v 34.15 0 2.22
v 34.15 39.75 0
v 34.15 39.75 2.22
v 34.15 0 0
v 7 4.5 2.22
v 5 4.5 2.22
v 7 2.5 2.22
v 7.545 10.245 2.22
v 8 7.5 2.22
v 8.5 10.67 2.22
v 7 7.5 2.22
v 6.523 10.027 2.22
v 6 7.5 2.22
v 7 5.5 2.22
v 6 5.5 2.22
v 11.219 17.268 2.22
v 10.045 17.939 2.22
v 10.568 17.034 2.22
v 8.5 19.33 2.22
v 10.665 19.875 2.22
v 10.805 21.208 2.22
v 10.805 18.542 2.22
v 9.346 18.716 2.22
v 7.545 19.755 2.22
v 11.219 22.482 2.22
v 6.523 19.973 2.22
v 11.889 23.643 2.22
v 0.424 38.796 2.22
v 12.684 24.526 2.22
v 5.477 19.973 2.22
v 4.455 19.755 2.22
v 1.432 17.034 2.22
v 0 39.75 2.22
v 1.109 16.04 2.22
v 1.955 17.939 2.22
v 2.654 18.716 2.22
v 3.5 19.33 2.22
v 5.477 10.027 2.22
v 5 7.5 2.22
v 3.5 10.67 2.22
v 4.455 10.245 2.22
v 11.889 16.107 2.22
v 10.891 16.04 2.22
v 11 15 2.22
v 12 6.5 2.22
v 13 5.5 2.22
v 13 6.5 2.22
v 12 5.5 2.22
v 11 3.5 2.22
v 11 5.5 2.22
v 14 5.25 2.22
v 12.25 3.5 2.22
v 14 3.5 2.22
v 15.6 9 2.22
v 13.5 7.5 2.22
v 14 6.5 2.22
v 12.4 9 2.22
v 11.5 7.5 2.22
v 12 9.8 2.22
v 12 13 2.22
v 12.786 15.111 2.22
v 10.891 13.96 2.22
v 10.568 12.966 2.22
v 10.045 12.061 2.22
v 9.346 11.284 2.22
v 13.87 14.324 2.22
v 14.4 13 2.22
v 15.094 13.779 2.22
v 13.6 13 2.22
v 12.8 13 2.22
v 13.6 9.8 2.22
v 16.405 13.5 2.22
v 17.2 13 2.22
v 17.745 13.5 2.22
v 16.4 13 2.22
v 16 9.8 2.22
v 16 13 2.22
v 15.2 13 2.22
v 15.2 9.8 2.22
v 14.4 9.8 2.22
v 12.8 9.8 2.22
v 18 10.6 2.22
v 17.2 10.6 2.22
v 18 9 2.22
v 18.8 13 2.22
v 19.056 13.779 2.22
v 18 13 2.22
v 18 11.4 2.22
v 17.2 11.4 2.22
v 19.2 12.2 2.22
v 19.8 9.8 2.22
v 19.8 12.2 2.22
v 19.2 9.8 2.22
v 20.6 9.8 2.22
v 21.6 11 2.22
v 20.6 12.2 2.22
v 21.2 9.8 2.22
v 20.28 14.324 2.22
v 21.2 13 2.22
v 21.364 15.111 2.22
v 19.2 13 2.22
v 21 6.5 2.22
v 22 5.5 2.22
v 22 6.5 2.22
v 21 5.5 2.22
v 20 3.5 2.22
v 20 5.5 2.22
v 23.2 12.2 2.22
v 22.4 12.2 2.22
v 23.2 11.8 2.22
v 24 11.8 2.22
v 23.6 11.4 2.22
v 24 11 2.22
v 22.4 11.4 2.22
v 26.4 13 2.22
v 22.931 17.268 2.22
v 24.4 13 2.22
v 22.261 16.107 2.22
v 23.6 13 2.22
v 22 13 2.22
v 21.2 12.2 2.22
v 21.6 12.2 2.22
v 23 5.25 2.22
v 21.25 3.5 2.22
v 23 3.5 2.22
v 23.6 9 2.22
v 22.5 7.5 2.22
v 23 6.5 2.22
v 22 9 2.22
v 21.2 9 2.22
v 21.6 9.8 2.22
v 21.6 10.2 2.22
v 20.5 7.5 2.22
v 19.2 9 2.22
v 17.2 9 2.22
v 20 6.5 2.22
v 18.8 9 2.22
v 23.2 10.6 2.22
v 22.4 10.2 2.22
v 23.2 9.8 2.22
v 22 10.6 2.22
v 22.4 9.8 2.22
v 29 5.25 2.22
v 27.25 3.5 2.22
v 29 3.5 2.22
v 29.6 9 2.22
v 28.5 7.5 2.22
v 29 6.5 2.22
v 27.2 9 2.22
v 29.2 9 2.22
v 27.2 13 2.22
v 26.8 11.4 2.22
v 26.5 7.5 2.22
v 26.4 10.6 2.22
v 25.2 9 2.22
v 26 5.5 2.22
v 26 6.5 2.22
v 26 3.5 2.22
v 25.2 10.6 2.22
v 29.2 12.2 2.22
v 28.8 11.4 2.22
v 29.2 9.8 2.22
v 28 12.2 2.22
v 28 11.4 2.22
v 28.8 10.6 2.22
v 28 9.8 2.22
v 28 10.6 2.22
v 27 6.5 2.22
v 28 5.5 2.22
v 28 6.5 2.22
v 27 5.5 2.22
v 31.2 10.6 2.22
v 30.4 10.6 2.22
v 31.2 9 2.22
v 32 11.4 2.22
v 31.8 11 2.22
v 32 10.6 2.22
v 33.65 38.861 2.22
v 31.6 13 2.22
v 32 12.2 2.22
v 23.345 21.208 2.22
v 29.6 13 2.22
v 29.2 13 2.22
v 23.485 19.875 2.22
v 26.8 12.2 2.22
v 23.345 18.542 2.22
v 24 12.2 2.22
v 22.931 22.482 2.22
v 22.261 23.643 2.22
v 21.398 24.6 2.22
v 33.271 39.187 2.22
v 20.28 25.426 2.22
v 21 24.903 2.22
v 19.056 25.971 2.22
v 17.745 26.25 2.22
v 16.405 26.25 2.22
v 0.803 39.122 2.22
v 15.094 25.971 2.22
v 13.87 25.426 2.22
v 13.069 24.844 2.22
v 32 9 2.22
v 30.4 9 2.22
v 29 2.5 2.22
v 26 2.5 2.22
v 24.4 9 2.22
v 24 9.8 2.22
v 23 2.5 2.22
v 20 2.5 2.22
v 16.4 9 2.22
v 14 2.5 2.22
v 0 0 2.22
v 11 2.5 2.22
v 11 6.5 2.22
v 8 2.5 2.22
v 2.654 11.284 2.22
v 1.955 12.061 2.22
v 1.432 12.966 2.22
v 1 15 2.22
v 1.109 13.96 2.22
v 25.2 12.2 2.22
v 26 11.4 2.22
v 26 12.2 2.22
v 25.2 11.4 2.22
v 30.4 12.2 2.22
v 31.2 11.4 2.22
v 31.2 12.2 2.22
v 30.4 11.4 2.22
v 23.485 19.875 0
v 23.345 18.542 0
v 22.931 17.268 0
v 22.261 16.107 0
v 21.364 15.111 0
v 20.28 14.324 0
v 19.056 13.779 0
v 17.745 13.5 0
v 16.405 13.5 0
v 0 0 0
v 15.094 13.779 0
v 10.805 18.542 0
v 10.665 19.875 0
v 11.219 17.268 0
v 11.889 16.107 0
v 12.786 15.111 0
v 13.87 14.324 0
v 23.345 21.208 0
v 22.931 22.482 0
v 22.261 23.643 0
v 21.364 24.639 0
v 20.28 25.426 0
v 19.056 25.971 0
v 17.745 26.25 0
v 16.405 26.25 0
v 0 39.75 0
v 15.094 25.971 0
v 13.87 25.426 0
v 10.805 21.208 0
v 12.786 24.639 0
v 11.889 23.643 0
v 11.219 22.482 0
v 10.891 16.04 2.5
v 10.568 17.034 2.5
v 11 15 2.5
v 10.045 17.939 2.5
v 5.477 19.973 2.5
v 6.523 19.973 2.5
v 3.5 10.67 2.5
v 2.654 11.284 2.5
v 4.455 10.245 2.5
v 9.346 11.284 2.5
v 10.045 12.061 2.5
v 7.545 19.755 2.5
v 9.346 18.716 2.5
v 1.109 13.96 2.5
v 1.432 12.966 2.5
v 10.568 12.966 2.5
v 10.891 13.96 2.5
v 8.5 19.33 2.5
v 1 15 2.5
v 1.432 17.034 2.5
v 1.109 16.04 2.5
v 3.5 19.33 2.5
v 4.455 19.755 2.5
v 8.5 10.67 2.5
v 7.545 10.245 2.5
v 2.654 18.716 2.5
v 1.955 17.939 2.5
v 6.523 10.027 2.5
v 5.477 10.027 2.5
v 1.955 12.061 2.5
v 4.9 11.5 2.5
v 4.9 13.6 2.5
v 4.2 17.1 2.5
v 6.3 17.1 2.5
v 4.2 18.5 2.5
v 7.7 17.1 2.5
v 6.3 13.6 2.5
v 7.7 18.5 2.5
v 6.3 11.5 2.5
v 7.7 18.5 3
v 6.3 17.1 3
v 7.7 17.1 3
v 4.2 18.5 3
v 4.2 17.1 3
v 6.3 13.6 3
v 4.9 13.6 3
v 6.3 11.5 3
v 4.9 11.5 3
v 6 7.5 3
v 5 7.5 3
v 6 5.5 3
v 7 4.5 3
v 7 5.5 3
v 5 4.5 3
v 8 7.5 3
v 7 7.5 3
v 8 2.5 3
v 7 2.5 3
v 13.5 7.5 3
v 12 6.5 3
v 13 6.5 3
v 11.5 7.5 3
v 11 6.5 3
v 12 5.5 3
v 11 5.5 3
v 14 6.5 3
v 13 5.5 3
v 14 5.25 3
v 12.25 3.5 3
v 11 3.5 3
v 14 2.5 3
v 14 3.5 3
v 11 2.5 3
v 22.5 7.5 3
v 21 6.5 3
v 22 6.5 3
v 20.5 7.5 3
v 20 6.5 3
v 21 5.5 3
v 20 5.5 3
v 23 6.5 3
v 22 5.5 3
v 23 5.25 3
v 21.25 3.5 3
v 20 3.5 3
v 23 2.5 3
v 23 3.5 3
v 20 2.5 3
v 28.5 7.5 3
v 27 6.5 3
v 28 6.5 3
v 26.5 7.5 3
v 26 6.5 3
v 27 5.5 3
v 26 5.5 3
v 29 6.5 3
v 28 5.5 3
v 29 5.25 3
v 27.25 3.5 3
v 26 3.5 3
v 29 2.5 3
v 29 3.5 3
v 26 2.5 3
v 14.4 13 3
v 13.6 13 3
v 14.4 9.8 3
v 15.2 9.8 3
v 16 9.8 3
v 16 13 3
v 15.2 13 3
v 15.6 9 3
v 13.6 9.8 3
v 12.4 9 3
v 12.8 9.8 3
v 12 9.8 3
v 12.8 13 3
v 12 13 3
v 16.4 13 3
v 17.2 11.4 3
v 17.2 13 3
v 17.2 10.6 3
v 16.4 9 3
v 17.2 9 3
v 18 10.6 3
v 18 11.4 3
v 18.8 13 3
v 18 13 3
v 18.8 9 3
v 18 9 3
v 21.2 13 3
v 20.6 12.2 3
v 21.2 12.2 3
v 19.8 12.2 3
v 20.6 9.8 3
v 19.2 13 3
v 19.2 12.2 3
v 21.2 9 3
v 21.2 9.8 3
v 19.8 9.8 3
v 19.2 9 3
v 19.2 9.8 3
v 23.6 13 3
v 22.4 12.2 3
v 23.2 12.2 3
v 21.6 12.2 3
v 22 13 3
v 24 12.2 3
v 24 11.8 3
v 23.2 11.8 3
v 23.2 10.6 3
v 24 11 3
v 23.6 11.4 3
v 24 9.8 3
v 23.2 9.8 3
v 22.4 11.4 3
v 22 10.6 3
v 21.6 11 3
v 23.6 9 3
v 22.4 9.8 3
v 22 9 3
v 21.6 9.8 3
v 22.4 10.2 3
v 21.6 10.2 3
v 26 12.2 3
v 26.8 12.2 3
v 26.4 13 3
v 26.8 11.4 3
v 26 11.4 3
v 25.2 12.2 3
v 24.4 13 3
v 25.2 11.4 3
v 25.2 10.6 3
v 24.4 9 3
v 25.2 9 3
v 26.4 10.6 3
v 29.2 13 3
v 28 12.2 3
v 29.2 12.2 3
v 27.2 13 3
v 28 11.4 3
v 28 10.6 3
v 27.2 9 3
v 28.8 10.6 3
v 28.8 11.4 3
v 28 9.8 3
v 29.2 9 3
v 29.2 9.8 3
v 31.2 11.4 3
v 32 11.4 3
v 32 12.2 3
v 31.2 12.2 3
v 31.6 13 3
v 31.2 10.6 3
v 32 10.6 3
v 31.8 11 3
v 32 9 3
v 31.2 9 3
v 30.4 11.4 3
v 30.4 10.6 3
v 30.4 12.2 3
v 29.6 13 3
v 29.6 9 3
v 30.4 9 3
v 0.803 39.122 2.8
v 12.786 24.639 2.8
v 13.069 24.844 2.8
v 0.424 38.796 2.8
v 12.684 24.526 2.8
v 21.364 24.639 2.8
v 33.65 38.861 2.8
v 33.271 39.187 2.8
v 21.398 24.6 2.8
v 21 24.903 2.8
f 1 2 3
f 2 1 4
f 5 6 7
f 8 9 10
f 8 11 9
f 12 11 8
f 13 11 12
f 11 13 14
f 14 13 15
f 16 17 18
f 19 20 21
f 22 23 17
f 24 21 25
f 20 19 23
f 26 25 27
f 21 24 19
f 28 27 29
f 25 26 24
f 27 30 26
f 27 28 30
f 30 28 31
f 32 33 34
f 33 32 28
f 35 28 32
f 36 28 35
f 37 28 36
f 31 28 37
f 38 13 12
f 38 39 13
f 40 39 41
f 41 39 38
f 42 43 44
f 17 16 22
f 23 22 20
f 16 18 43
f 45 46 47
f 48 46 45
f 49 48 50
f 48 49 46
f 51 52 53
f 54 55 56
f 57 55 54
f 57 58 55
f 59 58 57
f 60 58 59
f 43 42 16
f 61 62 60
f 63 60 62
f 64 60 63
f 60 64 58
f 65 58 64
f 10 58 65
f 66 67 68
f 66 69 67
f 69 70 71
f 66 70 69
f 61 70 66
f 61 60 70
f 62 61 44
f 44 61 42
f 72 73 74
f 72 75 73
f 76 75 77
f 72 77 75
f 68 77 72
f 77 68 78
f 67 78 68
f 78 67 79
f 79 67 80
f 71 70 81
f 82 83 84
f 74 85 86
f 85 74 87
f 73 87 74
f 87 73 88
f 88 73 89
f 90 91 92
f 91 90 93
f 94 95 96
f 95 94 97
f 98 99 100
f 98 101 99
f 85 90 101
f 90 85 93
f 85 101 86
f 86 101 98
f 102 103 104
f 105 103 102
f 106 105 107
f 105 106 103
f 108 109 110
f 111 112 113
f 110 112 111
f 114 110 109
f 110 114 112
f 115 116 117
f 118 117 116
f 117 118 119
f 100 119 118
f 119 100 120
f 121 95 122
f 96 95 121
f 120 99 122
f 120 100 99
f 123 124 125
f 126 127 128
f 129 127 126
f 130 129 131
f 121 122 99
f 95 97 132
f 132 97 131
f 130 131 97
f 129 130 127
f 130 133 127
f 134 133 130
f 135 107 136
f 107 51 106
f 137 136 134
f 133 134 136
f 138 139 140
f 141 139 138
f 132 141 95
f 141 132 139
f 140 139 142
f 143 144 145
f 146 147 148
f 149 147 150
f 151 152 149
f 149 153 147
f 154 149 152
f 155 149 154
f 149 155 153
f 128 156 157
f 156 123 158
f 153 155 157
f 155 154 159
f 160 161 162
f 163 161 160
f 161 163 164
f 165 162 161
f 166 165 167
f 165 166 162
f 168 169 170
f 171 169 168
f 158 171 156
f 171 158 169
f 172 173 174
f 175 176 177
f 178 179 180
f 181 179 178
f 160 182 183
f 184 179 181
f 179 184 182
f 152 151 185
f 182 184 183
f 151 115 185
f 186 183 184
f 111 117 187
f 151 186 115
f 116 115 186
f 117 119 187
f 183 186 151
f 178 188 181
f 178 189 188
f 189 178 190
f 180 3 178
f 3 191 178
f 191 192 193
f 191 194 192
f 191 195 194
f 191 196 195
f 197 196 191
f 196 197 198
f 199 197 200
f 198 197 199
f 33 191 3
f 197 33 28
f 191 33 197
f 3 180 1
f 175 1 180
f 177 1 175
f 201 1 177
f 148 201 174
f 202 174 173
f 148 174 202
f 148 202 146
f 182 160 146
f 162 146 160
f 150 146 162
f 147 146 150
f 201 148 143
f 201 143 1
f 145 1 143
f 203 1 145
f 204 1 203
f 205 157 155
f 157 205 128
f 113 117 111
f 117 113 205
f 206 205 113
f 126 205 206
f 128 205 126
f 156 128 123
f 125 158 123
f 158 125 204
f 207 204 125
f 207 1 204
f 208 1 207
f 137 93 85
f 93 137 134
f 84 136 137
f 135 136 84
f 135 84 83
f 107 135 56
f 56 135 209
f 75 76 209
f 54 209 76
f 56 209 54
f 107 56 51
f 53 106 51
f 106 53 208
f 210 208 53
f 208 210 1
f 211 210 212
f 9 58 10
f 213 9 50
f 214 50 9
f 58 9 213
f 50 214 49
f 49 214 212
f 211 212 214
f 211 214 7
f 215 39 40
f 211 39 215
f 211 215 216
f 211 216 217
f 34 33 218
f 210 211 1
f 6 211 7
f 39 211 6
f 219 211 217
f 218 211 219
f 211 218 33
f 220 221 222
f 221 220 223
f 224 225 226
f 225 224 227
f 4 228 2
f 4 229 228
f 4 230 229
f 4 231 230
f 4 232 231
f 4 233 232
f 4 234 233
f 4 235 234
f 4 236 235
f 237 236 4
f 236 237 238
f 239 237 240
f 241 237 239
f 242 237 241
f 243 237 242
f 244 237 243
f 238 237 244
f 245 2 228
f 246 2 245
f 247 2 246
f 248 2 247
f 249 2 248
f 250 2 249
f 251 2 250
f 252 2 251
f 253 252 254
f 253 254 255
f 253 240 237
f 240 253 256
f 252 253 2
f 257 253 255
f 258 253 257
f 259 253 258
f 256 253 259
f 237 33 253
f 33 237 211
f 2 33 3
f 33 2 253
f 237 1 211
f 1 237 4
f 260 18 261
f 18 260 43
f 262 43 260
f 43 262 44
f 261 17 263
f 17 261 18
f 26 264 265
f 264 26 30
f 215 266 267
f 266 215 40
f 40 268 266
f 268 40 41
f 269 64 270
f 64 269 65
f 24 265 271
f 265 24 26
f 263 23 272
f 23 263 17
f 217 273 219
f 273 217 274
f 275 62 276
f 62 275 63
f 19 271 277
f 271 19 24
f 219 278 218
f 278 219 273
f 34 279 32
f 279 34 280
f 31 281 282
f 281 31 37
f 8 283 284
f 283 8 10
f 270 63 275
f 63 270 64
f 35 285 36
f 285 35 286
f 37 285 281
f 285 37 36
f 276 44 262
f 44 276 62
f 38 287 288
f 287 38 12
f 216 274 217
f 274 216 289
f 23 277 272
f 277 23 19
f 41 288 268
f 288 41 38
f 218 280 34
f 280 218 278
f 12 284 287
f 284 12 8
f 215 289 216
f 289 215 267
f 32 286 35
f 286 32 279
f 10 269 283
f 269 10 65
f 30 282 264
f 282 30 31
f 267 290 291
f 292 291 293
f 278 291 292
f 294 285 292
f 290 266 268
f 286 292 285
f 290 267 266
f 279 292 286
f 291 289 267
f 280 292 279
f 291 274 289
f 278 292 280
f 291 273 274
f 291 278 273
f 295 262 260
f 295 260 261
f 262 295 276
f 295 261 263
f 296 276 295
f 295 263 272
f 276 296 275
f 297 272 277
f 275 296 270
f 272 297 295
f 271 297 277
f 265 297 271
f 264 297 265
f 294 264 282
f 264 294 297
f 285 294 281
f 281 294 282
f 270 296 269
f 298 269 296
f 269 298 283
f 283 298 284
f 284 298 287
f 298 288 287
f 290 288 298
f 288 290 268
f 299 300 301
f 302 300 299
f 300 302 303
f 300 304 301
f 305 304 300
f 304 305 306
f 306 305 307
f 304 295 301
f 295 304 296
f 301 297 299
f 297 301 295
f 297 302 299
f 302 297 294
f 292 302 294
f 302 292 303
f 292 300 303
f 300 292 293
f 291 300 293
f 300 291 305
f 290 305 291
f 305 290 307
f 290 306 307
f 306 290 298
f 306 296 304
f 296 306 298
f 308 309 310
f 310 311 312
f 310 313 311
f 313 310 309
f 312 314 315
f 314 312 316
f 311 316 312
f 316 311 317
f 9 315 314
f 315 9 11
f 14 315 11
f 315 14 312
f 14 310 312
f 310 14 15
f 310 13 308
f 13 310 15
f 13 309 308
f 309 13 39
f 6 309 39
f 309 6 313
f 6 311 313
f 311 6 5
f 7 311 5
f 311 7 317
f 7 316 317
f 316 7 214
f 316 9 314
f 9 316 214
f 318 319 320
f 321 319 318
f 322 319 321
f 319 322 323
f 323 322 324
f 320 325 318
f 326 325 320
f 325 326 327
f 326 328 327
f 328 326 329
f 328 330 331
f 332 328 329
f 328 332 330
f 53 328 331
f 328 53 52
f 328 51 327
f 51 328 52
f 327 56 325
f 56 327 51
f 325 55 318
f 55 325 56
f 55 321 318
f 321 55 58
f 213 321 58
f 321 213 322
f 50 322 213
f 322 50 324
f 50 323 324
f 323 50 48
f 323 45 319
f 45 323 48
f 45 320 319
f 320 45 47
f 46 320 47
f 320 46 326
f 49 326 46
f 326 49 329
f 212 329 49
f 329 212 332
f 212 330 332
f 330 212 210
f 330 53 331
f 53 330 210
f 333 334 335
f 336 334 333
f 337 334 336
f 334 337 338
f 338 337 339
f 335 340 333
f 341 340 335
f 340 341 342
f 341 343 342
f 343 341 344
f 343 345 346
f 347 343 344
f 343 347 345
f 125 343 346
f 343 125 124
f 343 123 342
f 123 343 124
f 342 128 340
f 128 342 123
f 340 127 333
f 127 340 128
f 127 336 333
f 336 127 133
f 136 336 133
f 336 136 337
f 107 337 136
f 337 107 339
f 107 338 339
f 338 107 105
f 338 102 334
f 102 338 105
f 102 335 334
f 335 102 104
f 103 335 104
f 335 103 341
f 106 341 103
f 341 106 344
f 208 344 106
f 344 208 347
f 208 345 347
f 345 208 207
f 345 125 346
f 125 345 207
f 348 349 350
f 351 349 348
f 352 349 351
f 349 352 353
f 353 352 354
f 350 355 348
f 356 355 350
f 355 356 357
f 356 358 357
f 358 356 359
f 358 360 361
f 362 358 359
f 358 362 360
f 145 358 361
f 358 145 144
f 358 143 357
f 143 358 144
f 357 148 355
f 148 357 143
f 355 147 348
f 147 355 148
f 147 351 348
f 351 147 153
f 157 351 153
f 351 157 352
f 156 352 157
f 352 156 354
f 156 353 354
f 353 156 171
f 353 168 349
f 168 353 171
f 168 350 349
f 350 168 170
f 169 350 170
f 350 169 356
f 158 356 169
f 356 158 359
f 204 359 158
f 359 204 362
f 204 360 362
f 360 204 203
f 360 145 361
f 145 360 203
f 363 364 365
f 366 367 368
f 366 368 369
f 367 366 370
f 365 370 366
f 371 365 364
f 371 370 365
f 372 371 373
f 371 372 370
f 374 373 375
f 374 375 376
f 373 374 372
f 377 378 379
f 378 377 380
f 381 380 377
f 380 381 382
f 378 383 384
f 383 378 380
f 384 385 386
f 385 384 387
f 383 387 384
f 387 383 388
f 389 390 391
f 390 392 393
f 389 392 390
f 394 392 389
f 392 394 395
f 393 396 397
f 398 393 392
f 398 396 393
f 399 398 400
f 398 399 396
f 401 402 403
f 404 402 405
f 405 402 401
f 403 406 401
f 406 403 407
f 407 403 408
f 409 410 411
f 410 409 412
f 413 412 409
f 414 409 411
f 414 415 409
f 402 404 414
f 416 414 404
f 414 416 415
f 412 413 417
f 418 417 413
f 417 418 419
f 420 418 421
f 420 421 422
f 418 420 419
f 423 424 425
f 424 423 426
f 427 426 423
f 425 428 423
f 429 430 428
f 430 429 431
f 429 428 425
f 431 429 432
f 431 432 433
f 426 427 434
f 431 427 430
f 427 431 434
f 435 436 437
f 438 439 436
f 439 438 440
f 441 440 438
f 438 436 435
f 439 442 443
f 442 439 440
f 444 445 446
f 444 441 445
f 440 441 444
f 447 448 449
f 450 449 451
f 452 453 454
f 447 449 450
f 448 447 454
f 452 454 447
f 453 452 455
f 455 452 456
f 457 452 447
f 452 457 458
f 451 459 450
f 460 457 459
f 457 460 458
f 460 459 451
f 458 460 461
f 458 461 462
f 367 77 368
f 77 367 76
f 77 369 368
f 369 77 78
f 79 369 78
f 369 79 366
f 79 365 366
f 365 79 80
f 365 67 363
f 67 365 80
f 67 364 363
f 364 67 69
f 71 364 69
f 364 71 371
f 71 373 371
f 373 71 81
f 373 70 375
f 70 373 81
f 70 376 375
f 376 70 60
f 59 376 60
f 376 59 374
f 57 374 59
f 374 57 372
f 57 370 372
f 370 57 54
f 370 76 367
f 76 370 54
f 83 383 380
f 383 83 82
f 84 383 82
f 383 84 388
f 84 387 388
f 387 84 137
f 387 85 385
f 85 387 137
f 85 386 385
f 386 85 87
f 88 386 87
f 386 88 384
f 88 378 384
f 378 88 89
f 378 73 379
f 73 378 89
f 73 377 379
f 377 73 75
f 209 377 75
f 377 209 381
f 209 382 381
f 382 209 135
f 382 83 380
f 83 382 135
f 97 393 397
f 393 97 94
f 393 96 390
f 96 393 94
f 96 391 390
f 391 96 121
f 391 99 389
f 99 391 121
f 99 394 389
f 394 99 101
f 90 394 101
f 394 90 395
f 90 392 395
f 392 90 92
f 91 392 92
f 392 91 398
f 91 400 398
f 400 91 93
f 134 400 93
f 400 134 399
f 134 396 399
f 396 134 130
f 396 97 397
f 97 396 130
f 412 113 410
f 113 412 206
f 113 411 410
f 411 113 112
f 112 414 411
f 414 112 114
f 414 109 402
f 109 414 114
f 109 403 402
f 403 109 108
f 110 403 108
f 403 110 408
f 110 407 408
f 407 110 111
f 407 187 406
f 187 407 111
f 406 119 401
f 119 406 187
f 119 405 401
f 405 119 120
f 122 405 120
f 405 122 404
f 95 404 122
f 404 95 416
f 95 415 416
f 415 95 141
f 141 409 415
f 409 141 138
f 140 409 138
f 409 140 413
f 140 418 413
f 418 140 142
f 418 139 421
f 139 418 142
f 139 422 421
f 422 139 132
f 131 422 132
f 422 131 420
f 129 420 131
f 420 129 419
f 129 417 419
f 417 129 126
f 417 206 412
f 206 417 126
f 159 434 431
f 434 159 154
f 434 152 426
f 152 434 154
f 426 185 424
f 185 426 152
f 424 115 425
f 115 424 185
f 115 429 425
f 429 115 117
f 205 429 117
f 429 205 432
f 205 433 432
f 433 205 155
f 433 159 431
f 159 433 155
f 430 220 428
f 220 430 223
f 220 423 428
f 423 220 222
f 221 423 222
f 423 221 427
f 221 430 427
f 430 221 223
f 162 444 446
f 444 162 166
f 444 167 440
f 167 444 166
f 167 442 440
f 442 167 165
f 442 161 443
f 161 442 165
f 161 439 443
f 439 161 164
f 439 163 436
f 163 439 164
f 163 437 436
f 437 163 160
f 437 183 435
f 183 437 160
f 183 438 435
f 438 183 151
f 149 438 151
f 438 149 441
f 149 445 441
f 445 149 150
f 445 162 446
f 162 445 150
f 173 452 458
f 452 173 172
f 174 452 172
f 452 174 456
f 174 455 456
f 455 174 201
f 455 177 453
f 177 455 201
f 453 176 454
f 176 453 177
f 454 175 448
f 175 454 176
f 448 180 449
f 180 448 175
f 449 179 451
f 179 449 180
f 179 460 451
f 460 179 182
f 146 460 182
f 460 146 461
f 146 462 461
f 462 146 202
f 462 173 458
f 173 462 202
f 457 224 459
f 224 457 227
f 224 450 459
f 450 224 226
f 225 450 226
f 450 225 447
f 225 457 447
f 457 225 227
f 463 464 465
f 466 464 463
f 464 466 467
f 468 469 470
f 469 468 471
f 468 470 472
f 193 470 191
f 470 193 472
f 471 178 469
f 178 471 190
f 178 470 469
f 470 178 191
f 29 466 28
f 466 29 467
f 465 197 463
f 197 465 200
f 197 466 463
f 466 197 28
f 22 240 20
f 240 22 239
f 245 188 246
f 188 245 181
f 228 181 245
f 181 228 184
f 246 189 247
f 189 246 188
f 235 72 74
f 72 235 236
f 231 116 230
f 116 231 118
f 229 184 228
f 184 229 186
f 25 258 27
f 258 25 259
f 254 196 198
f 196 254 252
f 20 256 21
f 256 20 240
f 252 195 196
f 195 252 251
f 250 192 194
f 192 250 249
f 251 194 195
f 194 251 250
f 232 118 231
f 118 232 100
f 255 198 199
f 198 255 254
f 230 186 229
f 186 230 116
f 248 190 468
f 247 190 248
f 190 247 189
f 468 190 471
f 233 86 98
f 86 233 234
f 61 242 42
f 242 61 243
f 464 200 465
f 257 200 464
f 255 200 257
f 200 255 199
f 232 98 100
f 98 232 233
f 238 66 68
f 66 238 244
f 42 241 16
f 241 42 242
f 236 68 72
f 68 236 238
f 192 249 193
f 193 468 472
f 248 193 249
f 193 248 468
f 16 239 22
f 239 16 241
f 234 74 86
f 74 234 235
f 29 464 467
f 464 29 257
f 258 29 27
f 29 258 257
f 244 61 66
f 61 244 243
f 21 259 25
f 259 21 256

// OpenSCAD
/* dial.scad
 *
 * Copyright (C) Robert B. Ross, 2014
 *
 * This software is released under the Creative Commons
 * Attribution-ShareAlike 4.0 International Public License.
 *
 * Spiff Sans code from Stuart P. Bentley <stuart@testtrack4.com>, downloaded 
 * 9/26/2014, released under the Creative Commons - Public Domain Dedication
 * license.
 *
 * TODO:
 *
 */

/* [Parameters] */
Pilot_Skill    = 7; // [0:11]
Primary_Weapon = 4; // [0:5]
Agility        = 2; // [0:5]
Hull           = 2; // [0:14]
Shield         = 2; // [0:10]
Text           = "Whisper"; 

/* [Hidden] */
$fn=30;
width=34.15;
height=39.75;
cylRad = 11.62/2+0.6;

id();

module id(myHeight = height, myWidth = width, myText = Text, myRad = cylRad,
          myHull = Hull)
{
    difference() {
        union() {
            /* main body */
            color("black") cube([myWidth,myHeight,2.22]);

            /* values */
            translate([6,15,0]) color("black") cylinder(h=2.5,r=5);
            translate([0,11.5,1.5]) scale([0.7,0.7,1])
		color("orange")
                linear_extrude(height=1.5) write(ints[Pilot_Skill]);
            translate([2,2.5,1.5]) scale([0.5,0.5,1])
		color("red")
                linear_extrude(height=1.5) write(ints[Primary_Weapon]);
            translate([8,2.5,1.5]) scale([0.5,0.5,1])
		color("green")
                linear_extrude(height=1.5) write(ints[Agility]);
            translate([17,2.5,1.5]) scale([0.5,0.5,1])
		color("yellow")
                linear_extrude(height=1.5) write(ints[myHull]);
            translate([23,2.5,1.5]) scale([0.5,0.5,1])
		color("blue")
                linear_extrude(height=1.5) write(ints[Shield]);

            /* string name */
            translate([12,9,1.5]) scale([0.4,0.4,1])
		color("white")
                linear_extrude(height=1.5) write(myText);

            /* firing arc */
            translate([myWidth/2,myHeight/2, 2.20]) rotate(atan(myHeight/myWidth))
	        translate([0,-0.2,0]) color("red")
		cube([sqrt(myHeight*myHeight + myWidth*myWidth)/2 - 1, 0.5, 0.6]);
            translate([myWidth/2,myHeight/2, 2.20]) rotate(180-atan(myHeight/myWidth))
	        translate([0,-0.2,0]) color("red")
		cube([sqrt(myHeight*myHeight + myWidth*myWidth)/2 - 1, 0.5, 0.6]);
        }

	/* take out the center hole */
        translate([myWidth/2, myHeight/2,-0.02]) cylinder(r=myRad, h=4);
    }
}

/******** PARAMETER SWEEP CODE FOR TUNING ********/

module paramSweep() {
    for (i = [0:4]) {
        for (j = [0:2]) {
            translate([40*i, 45*j, 0])
	        id(myHeight=height - 0.5 + 0.5 * j,
	           myWidth = width - 1.0 + 0.3*i, myText = "",
	           myRad = cylRad - 0.5 + 0.1 * (i + 5*j), myHull = i + 5*j);
        }
    }
}

/******** INTS TABLE ********/

/* Note: There must be a better way to do this! */
ints = [" 0", " 1", " 2", " 3", " 4", " 5", " 6", " 7", " 8", " 9", "10",
        "11", "12", "13", "14", "15", "16" ];

/******** BEGIN SPIFF SANS MODULES ********/

// Spiff Sans
// Author: Stuart P. Bentley <stuart@testtrack4.com>
// Version: 2.1.1

// https://github.com/stuartpb/spiffsans/blob/master/spiffsans.scad

spiffsans = [
  ["",10,[[[0,5],[5,0],[10,5],[5,10],[4.5,8],[5.5,8],[6.75,6.75],[6.75,5.75],[5.5,4.5],[5.5,3.75],[4.5,3.75],[4.5,4.75],[5.75,6],[5.75,6.5],[5.25,7],[4.75,7],[4.25,6.5],[4.25,6],[3.25,6],[3.25,6.75],[4.5,3],[5.5,3],[5.5,2],[4.5,2]],[[0,1,2,3],[4,5,6,7,8,9,10,11,12,13,14,15,16,17,18,19],[20,21,22,23]]]],
  [" ",5],
  ["!",2,[[[0,3],[0,10],[2,10],[2,3],[0,0],[0,2],[2,2],[2,0]],[[0,1,2,3],[4,5,6,7]]]],
  ["\"",6,[[[0,6],[0,10],[2,10],[2,6],[4,6],[4,10],[6,10],[6,6]],[[0,1,2,3],[4,5,6,7]]]],
  ["'",2,[[[0,6],[0,10],[2,10],[2,6]],[[0,1,2,3]]]],
  ["+",6,[[[2,2],[2,4],[0,4],[0,6],[2,6],[2,8],[4,8],[4,6],[6,6],[6,4],[4,4],[4,2]],[[0,1,2,3,4,5,6,7,8,9,10,11]]]],
  [",",2,[[[0,-2],[0,2],[2,2],[2,-2]],[[0,1,2,3]]]],
  ["-",4,[[[0,4],[0,6],[4,6],[4,4]],[[0,1,2,3]]]],
  [".",2,[[[0,0],[0,2],[2,2],[2,0]],[[0,1,2,3]]]],
  ["/",6,[[[0,0],[4,10],[6,10],[2,0]],[[0,1,2,3]]]],
  ["0",6,[[[5,0],[1,0],[0,2],[0,8],[1,10],[5,10],[6,8],[6,2],[2,8],[2,5],[4,8],[2,2],[4,2],[4,5]],[[0,1,2,3,4,5,6,7],[8,9,10],[11,12,13]]]],
  ["1",5,[[[0,0],[0,2],[2,2],[2,7],[0,7],[2,10],[4,10],[4,2],[5,2],[5,0]],[[0,1,2,3,4,5,6,7,8,9]]]],
  ["2",6,[[[0,0],[0,2],[4,6],[4,8],[2,8],[2,6],[0,6],[0,8],[1,10],[5,10],[6,8],[6,5.5],[2.5,2],[6,2],[6,0]],[[0,1,2,3,4,5,6,7,8,9,10,11,12,13,14]]]],
  ["3",6,[[[1,0],[0,2],[0,4],[2,4],[2,2],[4,2],[4,4],[3,4],[3,6],[4,6],[4,8],[2,8],[2,6],[0,6],[0,8],[1,10],[5,10],[6,8],[6,6],[5.5,5],[6,4],[6,2],[5,0]],[[0,1,2,3,4,5,6,7,8,9,10,11,12,13,14,15,16,17,18,19,20,21,22]]]],
  ["4",6,[[[4,0],[4,4],[0,4],[0,10],[2,10],[2,6],[4,6],[4,10],[6,10],[6,0]],[[0,1,2,3,4,5,6,7,8,9]]]],
  ["5",6,[[[0,0],[0,2],[4,2],[4.5,3],[4,4],[0,4],[0,10],[6,10],[6,8],[2,8],[2,6],[5,6],[6,4],[6,2],[5,0]],[[0,1,2,3,4,5,6,7,8,9,10,11,12,13,14]]]],
  ["6",6,[[[1,0],[0,2],[0,8],[1,10],[5,10],[5.5,8],[2,8],[2,6],[5,6],[6,4],[6,2],[5,0],[2,2],[4,2],[4,4],[2,4]],[[0,1,2,3,4,5,6,7,8,9,10,11],[12,13,14,15]]]],
  ["7",5,[[[1,0],[1,3],[3,8],[0,8],[0,10],[5,10],[5,8],[3,3],[3,0]],[[0,1,2,3,4,5,6,7,8]]]],
  ["8",6,[[[1,0],[0,2],[0,4],[0.5,5],[0,6],[0,8],[1,10],[5,10],[6,8],[6,6],[5.5,5],[6,4],[6,2],[5,0],[2,6],[4,6],[4,8],[2,8],[2,2],[4,2],[4,4],[2,4]],[[0,1,2,3,4,5,6,7,8,9,10,11,12,13],[14,15,16,17],[18,19,20,21]]]],
  ["9",6,[[[1,0],[0,2],[4,2],[4,4],[1,4],[0,6],[0,8],[1,10],[5,10],[6,8],[6,2],[5,0],[2,6],[4,6],[4,8],[2,8]],[[0,1,2,3,4,5,6,7,8,9,10,11],[12,13,14,15]]]],
  [":",2,[[[0,6],[0,8],[2,8],[2,6],[0,0],[0,2],[2,2],[2,0]],[[0,1,2,3],[4,5,6,7]]]],
  [";",2,[[[0,6],[0,8],[2,8],[2,6],[0,-2],[0,2],[2,2],[2,-2]],[[0,1,2,3],[4,5,6,7]]]],
  ["=",4,[[[0,6],[0,8],[4,8],[4,6],[0,2],[0,4],[4,4],[4,2]],[[0,1,2,3],[4,5,6,7]]]],
  ["?",6,[[[2,3],[4,6],[4,8],[2,8],[2,6],[0,6],[0,8],[2,10],[4,10],[6,8],[6,6],[4,3],[2,0],[2,2],[4,2],[4,0]],[[0,1,2,3,4,5,6,7,8,9,10,11],[12,13,14,15]]]],
  ["A",6,[[[0,0],[0,8],[1,10],[5,10],[6,8],[6,0],[4,0],[4,4],[2,4],[2,0],[2,6],[4,6],[4,8],[2,8]],[[0,1,2,3,4,5,6,7,8,9],[10,11,12,13]]]],
  ["B",6,[[[0,0],[0,10],[5,10],[6,8],[6,6],[5.5,5],[6,4],[6,2],[5,0],[2,6],[4,6],[4,8],[2,8],[2,2],[4,2],[4,4],[2,4]],[[0,1,2,3,4,5,6,7,8],[9,10,11,12],[13,14,15,16]]]],
  ["C",6,[[[6,0],[1,0],[0,2],[0,8],[1,10],[6,10],[6,8],[2,8],[2,2],[6,2]],[[0,1,2,3,4,5,6,7,8,9]]]],
  ["D",6,[[[0,0],[0,10],[5,10],[6,8],[6,2],[5,0],[2,2],[4,2],[4,8],[2,8]],[[0,1,2,3,4,5],[6,7,8,9]]]],
  ["E",5,[[[0,0],[0,10],[5,10],[5,8],[2,8],[2,6],[4,6],[4,4],[2,4],[2,2],[5,2],[5,0]],[[0,1,2,3,4,5,6,7,8,9,10,11]]]],
  ["F",5,[[[0,0],[0,10],[5,10],[5,8],[2,8],[2,6],[4,6],[4,4],[2,4],[2,0]],[[0,1,2,3,4,5,6,7,8,9]]]],
  ["G",6,[[[6,0],[1,0],[0,2],[0,8],[1,10],[5.5,10],[6,8],[2,8],[2,2],[4,2],[4,6],[6,6]],[[0,1,2,3,4,5,6,7,8,9,10,11]]]],
  ["H",6,[[[0,0],[0,10],[2,10],[2,6],[4,6],[4,10],[6,10],[6,0],[4,0],[4,4],[2,4],[2,0]],[[0,1,2,3,4,5,6,7,8,9,10,11]]]],
  ["I",5,[[[0,0],[0,2],[1.5,2],[1.5,8],[0,8],[0,10],[5,10],[5,8],[3.5,8],[3.5,2],[5,2],[5,0]],[[0,1,2,3,4,5,6,7,8,9,10,11]]]],
  ["J",6,[[[0.5,0],[0,1],[0,4],[2,4],[2,2],[4,2],[4,8],[0,8],[0,10],[6,10],[6,1],[5.5,0]],[[0,1,2,3,4,5,6,7,8,9,10,11]]]],
  ["K",6,[[[0,0],[0,10],[2,10],[2,6],[4,6],[4,10],[6,10],[6,6],[5,5],[6,4],[6,0],[4,0],[4,4],[2,4],[2,0]],[[0,1,2,3,4,5,6,7,8,9,10,11,12,13,14]]]],
  ["L",5,[[[0,0],[0,10],[2,10],[2,2],[5,2],[5,0]],[[0,1,2,3,4,5]]]],
  ["M",10,[[[0,0],[0,8],[1,10],[9,10],[10,8],[10,0],[8,0],[8,8],[6,8],[6,0],[4,0],[4,8],[2,8],[2,0]],[[0,1,2,3,4,5,6,7,8,9,10,11,12,13]]]],
  ["N",6,[[[0,0],[0,8],[1,10],[5,10],[6,8],[6,0],[4,0],[4,8],[2,8],[2,0]],[[0,1,2,3,4,5,6,7,8,9]]]],
  ["O",6,[[[5,0],[1,0],[0,2],[0,8],[1,10],[5,10],[6,8],[6,2],[2,2],[4,2],[4,8],[2,8]],[[0,1,2,3,4,5,6,7],[8,9,10,11]]]],
  ["P",6,[[[0,0],[0,10],[5,10],[6,8],[6,6],[5,4],[2,4],[2,0],[2,6],[4,6],[4,8],[2,8]],[[0,1,2,3,4,5,6,7],[8,9,10,11]]]],
  ["Q",6,[[[1,0],[0,2],[0,8],[1,10],[5,10],[6,8],[6,0],[2,2],[4,2],[4,8],[2,8]],[[0,1,2,3,4,5,6],[7,8,9,10]]]],
  ["R",6,[[[0,0],[0,10],[5,10],[6,8],[6,6],[5.5,5],[6,4],[6,0],[4,0],[4,4],[2,4],[2,0],[2,6],[4,6],[4,8],[2,8]],[[0,1,2,3,4,5,6,7,8,9,10,11],[12,13,14,15]]]],
  ["S",6,[[[1,0],[0,2],[0,3],[2,3],[2,2],[4,2],[4,4],[1,4],[0,5],[0,8],[1,10],[5,10],[6,8],[6,7],[4,7],[4,8],[2,8],[2,6],[5,6],[6,5],[6,2],[5,0]],[[0,1,2,3,4,5,6,7,8,9,10,11,12,13,14,15,16,17,18,19,20,21]]]],
  ["T",6,[[[2,0],[2,8],[0,8],[0,10],[6,10],[6,8],[4,8],[4,0]],[[0,1,2,3,4,5,6,7]]]],
  ["U",6,[[[1,0],[0,2],[0,10],[2,10],[2,2],[4,2],[4,10],[6,10],[6,2],[5,0]],[[0,1,2,3,4,5,6,7,8,9]]]],
  ["V",6,[[[2,0],[0,4],[0,10],[2,10],[2,4],[4,4],[4,10],[6,10],[6,4],[4,0]],[[0,1,2,3,4,5,6,7,8,9]]]],
  ["W",10,[[[9,0],[1,0],[0,2],[0,10],[2,10],[2,2],[4,2],[4,10],[6,10],[6,2],[8,2],[8,10],[10,10],[10,2]],[[0,1,2,3,4,5,6,7,8,9,10,11,12,13]]]],
  ["X",6,[[[0,0],[0,4],[1,5],[0,6],[0,10],[2,10],[2,6],[4,6],[4,10],[6,10],[6,6],[5,5],[6,4],[6,0],[4,0],[4,4],[2,4],[2,0]],[[0,1,2,3,4,5,6,7,8,9,10,11,12,13,14,15,16,17]]]],
  ["Y",6,[[[2,0],[2,4],[1,4],[0,6],[0,10],[2,10],[2,6],[4,6],[4,10],[6,10],[6,6],[5,4],[4,4],[4,0]],[[0,1,2,3,4,5,6,7,8,9,10,11,12,13]]]],
  ["Z",5,[[[0,0],[0,2],[3,8],[0,8],[0,10],[5,10],[5,8],[2,2],[5,2],[5,0]],[[0,1,2,3,4,5,6,7,8,9]]]],
  ["\\",6,[[[4,0],[0,10],[2,10],[6,0]],[[0,1,2,3]]]],
  ["_",6,[[[0,0],[0,2],[6,2],[6,0]],[[0,1,2,3]]]],
  ["`",4,[[[2,6],[0,10],[2,10],[4,6]],[[0,1,2,3]]]],
  ["a",6,[[[0,0],[0,8],[1,10],[5,10],[6,8],[6,0],[4,0],[4,4],[2,4],[2,0],[2,6],[4,6],[4,8],[2,8]],[[0,1,2,3,4,5,6,7,8,9],[10,11,12,13]]]],
  ["b",6,[[[0,0],[0,10],[5,10],[6,8],[6,6],[5.5,5],[6,4],[6,2],[5,0],[2,6],[4,6],[4,8],[2,8],[2,2],[4,2],[4,4],[2,4]],[[0,1,2,3,4,5,6,7,8],[9,10,11,12],[13,14,15,16]]]],
  ["c",6,[[[6,0],[1,0],[0,2],[0,8],[1,10],[6,10],[6,8],[2,8],[2,2],[6,2]],[[0,1,2,3,4,5,6,7,8,9]]]],
  ["d",6,[[[0,0],[0,10],[5,10],[6,8],[6,2],[5,0],[2,2],[4,2],[4,8],[2,8]],[[0,1,2,3,4,5],[6,7,8,9]]]],
  ["e",5,[[[0,0],[0,10],[5,10],[5,8],[2,8],[2,6],[4,6],[4,4],[2,4],[2,2],[5,2],[5,0]],[[0,1,2,3,4,5,6,7,8,9,10,11]]]],
  ["f",5,[[[0,0],[0,10],[5,10],[5,8],[2,8],[2,6],[4,6],[4,4],[2,4],[2,0]],[[0,1,2,3,4,5,6,7,8,9]]]],
  ["g",6,[[[6,0],[1,0],[0,2],[0,8],[1,10],[5.5,10],[6,8],[2,8],[2,2],[4,2],[4,6],[6,6]],[[0,1,2,3,4,5,6,7,8,9,10,11]]]],
  ["h",6,[[[0,0],[0,10],[2,10],[2,6],[4,6],[4,10],[6,10],[6,0],[4,0],[4,4],[2,4],[2,0]],[[0,1,2,3,4,5,6,7,8,9,10,11]]]],
  ["i",5,[[[0,0],[0,2],[1.5,2],[1.5,8],[0,8],[0,10],[5,10],[5,8],[3.5,8],[3.5,2],[5,2],[5,0]],[[0,1,2,3,4,5,6,7,8,9,10,11]]]],
  ["j",6,[[[0.5,0],[0,1],[0,4],[2,4],[2,2],[4,2],[4,8],[0,8],[0,10],[6,10],[6,1],[5.5,0]],[[0,1,2,3,4,5,6,7,8,9,10,11]]]],
  ["k",6,[[[0,0],[0,10],[2,10],[2,6],[4,6],[4,10],[6,10],[6,6],[5,5],[6,4],[6,0],[4,0],[4,4],[2,4],[2,0]],[[0,1,2,3,4,5,6,7,8,9,10,11,12,13,14]]]],
  ["l",5,[[[0,0],[0,10],[2,10],[2,2],[5,2],[5,0]],[[0,1,2,3,4,5]]]],
  ["m",10,[[[0,0],[0,8],[1,10],[9,10],[10,8],[10,0],[8,0],[8,8],[6,8],[6,0],[4,0],[4,8],[2,8],[2,0]],[[0,1,2,3,4,5,6,7,8,9,10,11,12,13]]]],
  ["n",6,[[[0,0],[0,8],[1,10],[5,10],[6,8],[6,0],[4,0],[4,8],[2,8],[2,0]],[[0,1,2,3,4,5,6,7,8,9]]]],
  ["o",6,[[[5,0],[1,0],[0,2],[0,8],[1,10],[5,10],[6,8],[6,2],[2,2],[4,2],[4,8],[2,8]],[[0,1,2,3,4,5,6,7],[8,9,10,11]]]],
  ["p",6,[[[0,0],[0,10],[5,10],[6,8],[6,6],[5,4],[2,4],[2,0],[2,6],[4,6],[4,8],[2,8]],[[0,1,2,3,4,5,6,7],[8,9,10,11]]]],
  ["q",6,[[[1,0],[0,2],[0,8],[1,10],[5,10],[6,8],[6,0],[2,2],[4,2],[4,8],[2,8]],[[0,1,2,3,4,5,6],[7,8,9,10]]]],
  ["r",6,[[[0,0],[0,10],[5,10],[6,8],[6,6],[5.5,5],[6,4],[6,0],[4,0],[4,4],[2,4],[2,0],[2,6],[4,6],[4,8],[2,8]],[[0,1,2,3,4,5,6,7,8,9,10,11],[12,13,14,15]]]],
  ["s",6,[[[1,0],[0,2],[0,3],[2,3],[2,2],[4,2],[4,4],[1,4],[0,5],[0,8],[1,10],[5,10],[6,8],[6,7],[4,7],[4,8],[2,8],[2,6],[5,6],[6,5],[6,2],[5,0]],[[0,1,2,3,4,5,6,7,8,9,10,11,12,13,14,15,16,17,18,19,20,21]]]],
  ["t",6,[[[2,0],[2,8],[0,8],[0,10],[6,10],[6,8],[4,8],[4,0]],[[0,1,2,3,4,5,6,7]]]],
  ["u",6,[[[1,0],[0,2],[0,10],[2,10],[2,2],[4,2],[4,10],[6,10],[6,2],[5,0]],[[0,1,2,3,4,5,6,7,8,9]]]],
  ["v",6,[[[2,0],[0,4],[0,10],[2,10],[2,4],[4,4],[4,10],[6,10],[6,4],[4,0]],[[0,1,2,3,4,5,6,7,8,9]]]],
  ["w",10,[[[9,0],[1,0],[0,2],[0,10],[2,10],[2,2],[4,2],[4,10],[6,10],[6,2],[8,2],[8,10],[10,10],[10,2]],[[0,1,2,3,4,5,6,7,8,9,10,11,12,13]]]],
  ["x",6,[[[0,0],[0,4],[1,5],[0,6],[0,10],[2,10],[2,6],[4,6],[4,10],[6,10],[6,6],[5,5],[6,4],[6,0],[4,0],[4,4],[2,4],[2,0]],[[0,1,2,3,4,5,6,7,8,9,10,11,12,13,14,15,16,17]]]],
  ["y",6,[[[2,0],[2,4],[1,4],[0,6],[0,10],[2,10],[2,6],[4,6],[4,10],[6,10],[6,6],[5,4],[4,4],[4,0]],[[0,1,2,3,4,5,6,7,8,9,10,11,12,13]]]],
  ["z",5,[[[0,0],[0,2],[3,8],[0,8],[0,10],[5,10],[5,8],[2,2],[5,2],[5,0]],[[0,1,2,3,4,5,6,7,8,9]]]],
  ["|",2,[[[0,0],[0,10],[2,10],[2,0]],[[0,1,2,3]]]]
];

module write(string,font=spiffsans,spacing=1,i=0) {
  if (i < len(string)) {
    assign(charindex = search(string[i],font,1)[0])
    
    // If the character is in the font
    if (charindex != undef) {
      assign(glyph = font[charindex][2])
      if (glyph){
        polygon(points=glyph[0], paths=glyph[1]);
      }
      translate([font[charindex][1] + spacing, 0, 0])
        write(string, font, spacing, i=i+1);
    } else {
      assign(glyph = font[0][2])
      if (glyph){
        polygon(points=glyph[0], paths=glyph[1]);
      }
      translate([font[0][1] + spacing,0,0])
        write(string, font, spacing, i=i+1);
    }
  }
}

/******** END SPIFF SANS MODULES ********/

/*
 * Local variables:
 *  mode: C
 *  c-indent-level: 4
 *  c-basic-offset: 4
 * End:
 *
 * vim: ts=8 sts=4 sw=4 expandtab
 */
